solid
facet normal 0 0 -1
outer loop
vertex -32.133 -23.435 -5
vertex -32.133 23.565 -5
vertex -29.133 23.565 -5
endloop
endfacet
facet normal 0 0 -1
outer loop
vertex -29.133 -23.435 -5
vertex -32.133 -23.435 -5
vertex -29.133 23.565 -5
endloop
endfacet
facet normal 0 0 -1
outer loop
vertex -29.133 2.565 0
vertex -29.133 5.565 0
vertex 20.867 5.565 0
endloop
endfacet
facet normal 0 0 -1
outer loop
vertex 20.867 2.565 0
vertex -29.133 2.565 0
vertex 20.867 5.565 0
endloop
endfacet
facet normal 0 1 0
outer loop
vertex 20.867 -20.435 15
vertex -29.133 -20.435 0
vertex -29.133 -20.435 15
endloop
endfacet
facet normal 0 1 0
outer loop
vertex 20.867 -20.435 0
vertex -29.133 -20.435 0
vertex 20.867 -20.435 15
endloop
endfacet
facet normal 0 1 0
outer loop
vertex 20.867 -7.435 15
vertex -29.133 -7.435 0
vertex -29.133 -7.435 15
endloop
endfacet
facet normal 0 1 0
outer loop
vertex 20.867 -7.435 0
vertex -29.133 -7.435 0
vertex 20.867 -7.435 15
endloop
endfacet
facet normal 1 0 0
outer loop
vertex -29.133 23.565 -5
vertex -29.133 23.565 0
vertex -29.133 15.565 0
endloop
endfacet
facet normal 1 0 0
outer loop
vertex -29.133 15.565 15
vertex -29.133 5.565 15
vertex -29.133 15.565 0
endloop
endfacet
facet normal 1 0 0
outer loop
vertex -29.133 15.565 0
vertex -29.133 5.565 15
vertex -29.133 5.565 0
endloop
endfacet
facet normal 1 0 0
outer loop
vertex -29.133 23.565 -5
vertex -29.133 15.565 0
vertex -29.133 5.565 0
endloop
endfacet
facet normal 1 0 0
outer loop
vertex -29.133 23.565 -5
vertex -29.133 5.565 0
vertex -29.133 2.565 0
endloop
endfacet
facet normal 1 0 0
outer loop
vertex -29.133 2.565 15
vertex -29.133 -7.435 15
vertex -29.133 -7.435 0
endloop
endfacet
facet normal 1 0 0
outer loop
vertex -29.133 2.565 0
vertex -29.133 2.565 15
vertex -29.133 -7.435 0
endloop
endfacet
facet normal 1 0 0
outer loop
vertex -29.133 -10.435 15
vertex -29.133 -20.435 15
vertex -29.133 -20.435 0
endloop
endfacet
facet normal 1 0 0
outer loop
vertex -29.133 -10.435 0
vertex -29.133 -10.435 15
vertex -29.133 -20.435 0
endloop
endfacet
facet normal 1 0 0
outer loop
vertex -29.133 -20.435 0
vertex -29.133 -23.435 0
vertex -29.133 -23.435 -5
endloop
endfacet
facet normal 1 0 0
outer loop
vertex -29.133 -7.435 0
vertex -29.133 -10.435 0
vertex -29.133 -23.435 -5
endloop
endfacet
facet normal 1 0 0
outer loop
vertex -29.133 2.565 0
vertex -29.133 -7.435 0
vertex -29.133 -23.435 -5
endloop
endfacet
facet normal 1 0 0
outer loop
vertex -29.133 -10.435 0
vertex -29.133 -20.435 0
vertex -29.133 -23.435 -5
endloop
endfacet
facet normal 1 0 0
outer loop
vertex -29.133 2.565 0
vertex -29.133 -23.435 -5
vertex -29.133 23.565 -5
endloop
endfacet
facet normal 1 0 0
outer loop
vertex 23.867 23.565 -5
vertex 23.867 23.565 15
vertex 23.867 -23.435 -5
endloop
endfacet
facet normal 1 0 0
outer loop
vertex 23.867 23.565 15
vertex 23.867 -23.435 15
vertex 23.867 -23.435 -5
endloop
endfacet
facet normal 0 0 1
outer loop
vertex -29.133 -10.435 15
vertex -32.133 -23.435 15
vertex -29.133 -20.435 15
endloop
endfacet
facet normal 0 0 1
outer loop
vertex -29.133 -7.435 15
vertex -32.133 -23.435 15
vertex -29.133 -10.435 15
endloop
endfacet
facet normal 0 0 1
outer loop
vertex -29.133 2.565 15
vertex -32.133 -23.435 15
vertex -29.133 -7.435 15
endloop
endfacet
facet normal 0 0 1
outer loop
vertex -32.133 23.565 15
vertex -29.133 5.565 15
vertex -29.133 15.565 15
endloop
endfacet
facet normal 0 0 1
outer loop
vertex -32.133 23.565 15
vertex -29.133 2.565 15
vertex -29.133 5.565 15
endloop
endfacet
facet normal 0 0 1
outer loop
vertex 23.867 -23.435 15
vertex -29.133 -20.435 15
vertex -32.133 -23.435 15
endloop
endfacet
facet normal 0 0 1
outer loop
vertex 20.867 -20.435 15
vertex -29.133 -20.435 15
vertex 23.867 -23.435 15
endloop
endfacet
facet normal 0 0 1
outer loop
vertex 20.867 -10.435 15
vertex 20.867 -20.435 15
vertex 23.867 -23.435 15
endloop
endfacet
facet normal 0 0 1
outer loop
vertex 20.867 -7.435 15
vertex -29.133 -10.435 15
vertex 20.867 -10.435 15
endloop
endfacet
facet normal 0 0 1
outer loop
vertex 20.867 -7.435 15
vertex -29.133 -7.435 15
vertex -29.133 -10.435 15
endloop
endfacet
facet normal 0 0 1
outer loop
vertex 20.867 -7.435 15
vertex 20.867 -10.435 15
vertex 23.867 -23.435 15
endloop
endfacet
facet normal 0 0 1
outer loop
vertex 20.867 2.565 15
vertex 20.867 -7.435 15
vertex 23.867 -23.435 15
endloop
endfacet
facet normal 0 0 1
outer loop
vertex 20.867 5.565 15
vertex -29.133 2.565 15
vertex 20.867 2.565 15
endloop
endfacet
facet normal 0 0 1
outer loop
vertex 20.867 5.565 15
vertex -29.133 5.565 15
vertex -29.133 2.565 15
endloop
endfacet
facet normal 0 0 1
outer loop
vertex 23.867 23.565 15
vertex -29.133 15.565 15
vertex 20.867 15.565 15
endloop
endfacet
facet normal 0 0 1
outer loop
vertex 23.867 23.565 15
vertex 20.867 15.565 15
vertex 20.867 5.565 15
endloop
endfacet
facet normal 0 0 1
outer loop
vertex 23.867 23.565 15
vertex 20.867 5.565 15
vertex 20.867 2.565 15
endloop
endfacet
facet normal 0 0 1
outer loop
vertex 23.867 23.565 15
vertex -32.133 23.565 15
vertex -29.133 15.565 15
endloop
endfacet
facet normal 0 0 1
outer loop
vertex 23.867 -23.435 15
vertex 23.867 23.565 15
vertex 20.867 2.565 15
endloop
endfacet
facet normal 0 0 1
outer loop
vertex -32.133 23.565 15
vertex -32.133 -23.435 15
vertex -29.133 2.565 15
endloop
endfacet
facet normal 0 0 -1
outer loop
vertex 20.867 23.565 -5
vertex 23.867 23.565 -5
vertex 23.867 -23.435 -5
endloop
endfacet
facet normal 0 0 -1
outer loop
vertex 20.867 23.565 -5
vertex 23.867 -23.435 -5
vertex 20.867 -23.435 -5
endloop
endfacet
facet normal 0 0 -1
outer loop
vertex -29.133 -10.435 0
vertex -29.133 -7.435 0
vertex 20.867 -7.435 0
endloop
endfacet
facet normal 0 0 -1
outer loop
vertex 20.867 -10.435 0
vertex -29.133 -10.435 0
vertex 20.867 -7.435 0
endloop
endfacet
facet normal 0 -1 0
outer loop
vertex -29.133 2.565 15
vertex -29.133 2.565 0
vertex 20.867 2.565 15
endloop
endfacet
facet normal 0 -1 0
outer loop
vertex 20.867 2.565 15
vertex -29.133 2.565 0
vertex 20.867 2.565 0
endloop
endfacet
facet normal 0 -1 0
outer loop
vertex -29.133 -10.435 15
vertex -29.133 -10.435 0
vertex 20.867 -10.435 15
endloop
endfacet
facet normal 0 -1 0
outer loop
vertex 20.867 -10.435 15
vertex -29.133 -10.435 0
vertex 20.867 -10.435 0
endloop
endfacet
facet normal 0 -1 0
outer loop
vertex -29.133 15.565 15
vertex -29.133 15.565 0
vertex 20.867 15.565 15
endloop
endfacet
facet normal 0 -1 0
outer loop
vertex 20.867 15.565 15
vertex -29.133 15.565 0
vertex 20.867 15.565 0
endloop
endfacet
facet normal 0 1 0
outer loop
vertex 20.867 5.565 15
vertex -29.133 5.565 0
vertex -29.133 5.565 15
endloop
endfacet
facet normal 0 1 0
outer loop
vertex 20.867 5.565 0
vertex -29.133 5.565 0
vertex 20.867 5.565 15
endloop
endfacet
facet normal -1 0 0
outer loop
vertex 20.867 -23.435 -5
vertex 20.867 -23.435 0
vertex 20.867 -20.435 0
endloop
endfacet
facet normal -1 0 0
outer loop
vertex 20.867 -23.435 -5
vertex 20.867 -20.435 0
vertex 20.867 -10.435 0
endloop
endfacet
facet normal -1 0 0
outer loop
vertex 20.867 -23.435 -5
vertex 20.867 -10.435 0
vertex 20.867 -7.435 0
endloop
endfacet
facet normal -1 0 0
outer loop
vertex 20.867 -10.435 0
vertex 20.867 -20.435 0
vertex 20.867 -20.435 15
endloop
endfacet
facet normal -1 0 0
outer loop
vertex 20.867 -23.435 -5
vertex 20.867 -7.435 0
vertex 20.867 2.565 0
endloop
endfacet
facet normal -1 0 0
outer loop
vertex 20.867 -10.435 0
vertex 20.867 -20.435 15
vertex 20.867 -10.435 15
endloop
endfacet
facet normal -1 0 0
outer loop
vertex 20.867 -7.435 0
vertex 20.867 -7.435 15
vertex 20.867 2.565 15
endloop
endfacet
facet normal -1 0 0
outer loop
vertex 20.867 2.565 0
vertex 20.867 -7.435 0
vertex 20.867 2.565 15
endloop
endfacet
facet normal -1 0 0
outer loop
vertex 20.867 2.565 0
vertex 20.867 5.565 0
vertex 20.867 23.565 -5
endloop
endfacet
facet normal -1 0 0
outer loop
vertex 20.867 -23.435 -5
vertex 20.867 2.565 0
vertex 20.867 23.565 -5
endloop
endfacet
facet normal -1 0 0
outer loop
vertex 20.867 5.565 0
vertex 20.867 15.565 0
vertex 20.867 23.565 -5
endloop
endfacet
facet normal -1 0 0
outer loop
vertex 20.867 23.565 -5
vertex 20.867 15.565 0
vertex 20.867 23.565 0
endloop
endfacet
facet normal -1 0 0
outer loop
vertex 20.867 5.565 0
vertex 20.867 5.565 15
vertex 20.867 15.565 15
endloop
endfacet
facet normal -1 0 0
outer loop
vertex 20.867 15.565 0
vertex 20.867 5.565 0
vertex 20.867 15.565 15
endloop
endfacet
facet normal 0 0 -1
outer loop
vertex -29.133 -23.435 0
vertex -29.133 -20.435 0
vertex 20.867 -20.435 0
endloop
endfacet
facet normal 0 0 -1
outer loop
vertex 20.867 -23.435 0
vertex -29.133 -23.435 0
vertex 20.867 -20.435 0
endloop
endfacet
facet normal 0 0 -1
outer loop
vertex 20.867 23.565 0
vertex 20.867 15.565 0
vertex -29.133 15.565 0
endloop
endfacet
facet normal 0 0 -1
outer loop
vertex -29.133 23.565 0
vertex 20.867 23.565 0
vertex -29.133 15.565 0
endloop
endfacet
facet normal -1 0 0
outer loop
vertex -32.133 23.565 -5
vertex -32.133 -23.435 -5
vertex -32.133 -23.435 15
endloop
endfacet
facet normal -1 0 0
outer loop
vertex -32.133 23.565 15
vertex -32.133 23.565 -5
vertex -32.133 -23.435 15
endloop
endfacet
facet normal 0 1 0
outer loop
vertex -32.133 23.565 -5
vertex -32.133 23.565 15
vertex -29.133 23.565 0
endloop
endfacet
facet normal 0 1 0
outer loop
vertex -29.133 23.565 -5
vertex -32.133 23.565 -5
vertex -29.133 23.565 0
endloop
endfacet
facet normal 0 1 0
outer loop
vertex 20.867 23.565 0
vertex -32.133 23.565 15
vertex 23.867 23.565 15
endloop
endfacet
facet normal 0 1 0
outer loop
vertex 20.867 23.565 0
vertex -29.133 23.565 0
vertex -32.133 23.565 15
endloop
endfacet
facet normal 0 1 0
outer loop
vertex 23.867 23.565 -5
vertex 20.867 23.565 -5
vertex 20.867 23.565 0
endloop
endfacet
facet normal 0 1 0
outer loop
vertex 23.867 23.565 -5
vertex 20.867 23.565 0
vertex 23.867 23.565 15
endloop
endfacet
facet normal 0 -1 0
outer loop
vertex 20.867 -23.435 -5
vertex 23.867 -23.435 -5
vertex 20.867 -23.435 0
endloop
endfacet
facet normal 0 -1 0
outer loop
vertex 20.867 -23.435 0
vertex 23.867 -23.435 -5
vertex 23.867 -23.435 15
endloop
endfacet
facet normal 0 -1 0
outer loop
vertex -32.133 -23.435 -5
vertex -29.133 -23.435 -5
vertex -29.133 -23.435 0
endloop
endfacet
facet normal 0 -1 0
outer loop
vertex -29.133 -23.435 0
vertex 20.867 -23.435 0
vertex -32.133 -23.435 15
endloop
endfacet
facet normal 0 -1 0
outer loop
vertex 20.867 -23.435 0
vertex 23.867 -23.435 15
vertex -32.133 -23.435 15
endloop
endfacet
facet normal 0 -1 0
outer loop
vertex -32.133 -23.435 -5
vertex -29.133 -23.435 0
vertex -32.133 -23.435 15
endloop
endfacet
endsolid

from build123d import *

# Parameters (mm, degrees)
SKETCH_2_W      = 50
SKETCH_2_H      = 10
EXTRUDE_1_DEPTH = 15
SKETCH_3_W      = 3
SKETCH_3_H      = 42
EXTRUDE_2_DEPTH = 5
SKETCH_4_W      = 3
SKETCH_4_H      = 5
EXTRUDE_4_DEPTH = 5
EXTRUDE_5_DEPTH = 5


with BuildPart() as part:
    # 草图2 → 凸台-拉伸1 (new body)
    with BuildSketch(Plane.XY):
        Polygon((-29.132569558, 18.56468986), (-32.132569558, 18.56468986), (-32.132569558, -23.43531014), (-29.132569558, -23.43531014), (23.867430442, -23.43531014), (23.867430442, 18.56468986), align=None)
        with Locations((-4.132569558, 10.56468986)):
            Rectangle(SKETCH_2_W, SKETCH_2_H, mode=Mode.SUBTRACT)
        with Locations((-4.132569558, -2.43531014)):
            Rectangle(SKETCH_2_W, SKETCH_2_H, mode=Mode.SUBTRACT)
        with Locations((-4.132569558, -15.43531014)):
            Rectangle(SKETCH_2_W, SKETCH_2_H, mode=Mode.SUBTRACT)
    extrude(amount=EXTRUDE_1_DEPTH)

    # 草图3 → 凸台-拉伸2 (add)
    with BuildSketch(Plane(origin=(0, 0, 0), x_dir=(-1, 0, 0), z_dir=(0, 0, -1))):
        with Locations((30.632569558, -2.43531014)):
            Rectangle(SKETCH_3_W, SKETCH_3_H)
        with Locations((-22.367430442, -2.43531014)):
            Rectangle(SKETCH_3_W, SKETCH_3_H)
    extrude(amount=EXTRUDE_2_DEPTH)

    # 草图4 → 凸台-拉伸4 (add)
    with BuildSketch(Plane(origin=(0, 18.56468986, 0), x_dir=(1, 0, 0), z_dir=(0, 1, 0))):
        with Locations((-30.632569558, 2.5)):
            Rectangle(SKETCH_4_W, SKETCH_4_H)
        with Locations((22.367430442, 2.5)):
            Rectangle(SKETCH_4_W, SKETCH_4_H)
    extrude(amount=EXTRUDE_4_DEPTH)

    # 草图5 → 凸台-拉伸5 (add)
    with BuildSketch(Plane(origin=(0, 18.56468986, 0), x_dir=(1, 0, 0), z_dir=(0, 1, 0))):
        Polygon((23.867430442, 0), (20.867430442, 0), (-29.132569558, 0), (-32.132569558, 0), (-32.132569558, -15), (23.867430442, -15), align=None)
    extrude(amount=EXTRUDE_5_DEPTH)


solid = part.part
